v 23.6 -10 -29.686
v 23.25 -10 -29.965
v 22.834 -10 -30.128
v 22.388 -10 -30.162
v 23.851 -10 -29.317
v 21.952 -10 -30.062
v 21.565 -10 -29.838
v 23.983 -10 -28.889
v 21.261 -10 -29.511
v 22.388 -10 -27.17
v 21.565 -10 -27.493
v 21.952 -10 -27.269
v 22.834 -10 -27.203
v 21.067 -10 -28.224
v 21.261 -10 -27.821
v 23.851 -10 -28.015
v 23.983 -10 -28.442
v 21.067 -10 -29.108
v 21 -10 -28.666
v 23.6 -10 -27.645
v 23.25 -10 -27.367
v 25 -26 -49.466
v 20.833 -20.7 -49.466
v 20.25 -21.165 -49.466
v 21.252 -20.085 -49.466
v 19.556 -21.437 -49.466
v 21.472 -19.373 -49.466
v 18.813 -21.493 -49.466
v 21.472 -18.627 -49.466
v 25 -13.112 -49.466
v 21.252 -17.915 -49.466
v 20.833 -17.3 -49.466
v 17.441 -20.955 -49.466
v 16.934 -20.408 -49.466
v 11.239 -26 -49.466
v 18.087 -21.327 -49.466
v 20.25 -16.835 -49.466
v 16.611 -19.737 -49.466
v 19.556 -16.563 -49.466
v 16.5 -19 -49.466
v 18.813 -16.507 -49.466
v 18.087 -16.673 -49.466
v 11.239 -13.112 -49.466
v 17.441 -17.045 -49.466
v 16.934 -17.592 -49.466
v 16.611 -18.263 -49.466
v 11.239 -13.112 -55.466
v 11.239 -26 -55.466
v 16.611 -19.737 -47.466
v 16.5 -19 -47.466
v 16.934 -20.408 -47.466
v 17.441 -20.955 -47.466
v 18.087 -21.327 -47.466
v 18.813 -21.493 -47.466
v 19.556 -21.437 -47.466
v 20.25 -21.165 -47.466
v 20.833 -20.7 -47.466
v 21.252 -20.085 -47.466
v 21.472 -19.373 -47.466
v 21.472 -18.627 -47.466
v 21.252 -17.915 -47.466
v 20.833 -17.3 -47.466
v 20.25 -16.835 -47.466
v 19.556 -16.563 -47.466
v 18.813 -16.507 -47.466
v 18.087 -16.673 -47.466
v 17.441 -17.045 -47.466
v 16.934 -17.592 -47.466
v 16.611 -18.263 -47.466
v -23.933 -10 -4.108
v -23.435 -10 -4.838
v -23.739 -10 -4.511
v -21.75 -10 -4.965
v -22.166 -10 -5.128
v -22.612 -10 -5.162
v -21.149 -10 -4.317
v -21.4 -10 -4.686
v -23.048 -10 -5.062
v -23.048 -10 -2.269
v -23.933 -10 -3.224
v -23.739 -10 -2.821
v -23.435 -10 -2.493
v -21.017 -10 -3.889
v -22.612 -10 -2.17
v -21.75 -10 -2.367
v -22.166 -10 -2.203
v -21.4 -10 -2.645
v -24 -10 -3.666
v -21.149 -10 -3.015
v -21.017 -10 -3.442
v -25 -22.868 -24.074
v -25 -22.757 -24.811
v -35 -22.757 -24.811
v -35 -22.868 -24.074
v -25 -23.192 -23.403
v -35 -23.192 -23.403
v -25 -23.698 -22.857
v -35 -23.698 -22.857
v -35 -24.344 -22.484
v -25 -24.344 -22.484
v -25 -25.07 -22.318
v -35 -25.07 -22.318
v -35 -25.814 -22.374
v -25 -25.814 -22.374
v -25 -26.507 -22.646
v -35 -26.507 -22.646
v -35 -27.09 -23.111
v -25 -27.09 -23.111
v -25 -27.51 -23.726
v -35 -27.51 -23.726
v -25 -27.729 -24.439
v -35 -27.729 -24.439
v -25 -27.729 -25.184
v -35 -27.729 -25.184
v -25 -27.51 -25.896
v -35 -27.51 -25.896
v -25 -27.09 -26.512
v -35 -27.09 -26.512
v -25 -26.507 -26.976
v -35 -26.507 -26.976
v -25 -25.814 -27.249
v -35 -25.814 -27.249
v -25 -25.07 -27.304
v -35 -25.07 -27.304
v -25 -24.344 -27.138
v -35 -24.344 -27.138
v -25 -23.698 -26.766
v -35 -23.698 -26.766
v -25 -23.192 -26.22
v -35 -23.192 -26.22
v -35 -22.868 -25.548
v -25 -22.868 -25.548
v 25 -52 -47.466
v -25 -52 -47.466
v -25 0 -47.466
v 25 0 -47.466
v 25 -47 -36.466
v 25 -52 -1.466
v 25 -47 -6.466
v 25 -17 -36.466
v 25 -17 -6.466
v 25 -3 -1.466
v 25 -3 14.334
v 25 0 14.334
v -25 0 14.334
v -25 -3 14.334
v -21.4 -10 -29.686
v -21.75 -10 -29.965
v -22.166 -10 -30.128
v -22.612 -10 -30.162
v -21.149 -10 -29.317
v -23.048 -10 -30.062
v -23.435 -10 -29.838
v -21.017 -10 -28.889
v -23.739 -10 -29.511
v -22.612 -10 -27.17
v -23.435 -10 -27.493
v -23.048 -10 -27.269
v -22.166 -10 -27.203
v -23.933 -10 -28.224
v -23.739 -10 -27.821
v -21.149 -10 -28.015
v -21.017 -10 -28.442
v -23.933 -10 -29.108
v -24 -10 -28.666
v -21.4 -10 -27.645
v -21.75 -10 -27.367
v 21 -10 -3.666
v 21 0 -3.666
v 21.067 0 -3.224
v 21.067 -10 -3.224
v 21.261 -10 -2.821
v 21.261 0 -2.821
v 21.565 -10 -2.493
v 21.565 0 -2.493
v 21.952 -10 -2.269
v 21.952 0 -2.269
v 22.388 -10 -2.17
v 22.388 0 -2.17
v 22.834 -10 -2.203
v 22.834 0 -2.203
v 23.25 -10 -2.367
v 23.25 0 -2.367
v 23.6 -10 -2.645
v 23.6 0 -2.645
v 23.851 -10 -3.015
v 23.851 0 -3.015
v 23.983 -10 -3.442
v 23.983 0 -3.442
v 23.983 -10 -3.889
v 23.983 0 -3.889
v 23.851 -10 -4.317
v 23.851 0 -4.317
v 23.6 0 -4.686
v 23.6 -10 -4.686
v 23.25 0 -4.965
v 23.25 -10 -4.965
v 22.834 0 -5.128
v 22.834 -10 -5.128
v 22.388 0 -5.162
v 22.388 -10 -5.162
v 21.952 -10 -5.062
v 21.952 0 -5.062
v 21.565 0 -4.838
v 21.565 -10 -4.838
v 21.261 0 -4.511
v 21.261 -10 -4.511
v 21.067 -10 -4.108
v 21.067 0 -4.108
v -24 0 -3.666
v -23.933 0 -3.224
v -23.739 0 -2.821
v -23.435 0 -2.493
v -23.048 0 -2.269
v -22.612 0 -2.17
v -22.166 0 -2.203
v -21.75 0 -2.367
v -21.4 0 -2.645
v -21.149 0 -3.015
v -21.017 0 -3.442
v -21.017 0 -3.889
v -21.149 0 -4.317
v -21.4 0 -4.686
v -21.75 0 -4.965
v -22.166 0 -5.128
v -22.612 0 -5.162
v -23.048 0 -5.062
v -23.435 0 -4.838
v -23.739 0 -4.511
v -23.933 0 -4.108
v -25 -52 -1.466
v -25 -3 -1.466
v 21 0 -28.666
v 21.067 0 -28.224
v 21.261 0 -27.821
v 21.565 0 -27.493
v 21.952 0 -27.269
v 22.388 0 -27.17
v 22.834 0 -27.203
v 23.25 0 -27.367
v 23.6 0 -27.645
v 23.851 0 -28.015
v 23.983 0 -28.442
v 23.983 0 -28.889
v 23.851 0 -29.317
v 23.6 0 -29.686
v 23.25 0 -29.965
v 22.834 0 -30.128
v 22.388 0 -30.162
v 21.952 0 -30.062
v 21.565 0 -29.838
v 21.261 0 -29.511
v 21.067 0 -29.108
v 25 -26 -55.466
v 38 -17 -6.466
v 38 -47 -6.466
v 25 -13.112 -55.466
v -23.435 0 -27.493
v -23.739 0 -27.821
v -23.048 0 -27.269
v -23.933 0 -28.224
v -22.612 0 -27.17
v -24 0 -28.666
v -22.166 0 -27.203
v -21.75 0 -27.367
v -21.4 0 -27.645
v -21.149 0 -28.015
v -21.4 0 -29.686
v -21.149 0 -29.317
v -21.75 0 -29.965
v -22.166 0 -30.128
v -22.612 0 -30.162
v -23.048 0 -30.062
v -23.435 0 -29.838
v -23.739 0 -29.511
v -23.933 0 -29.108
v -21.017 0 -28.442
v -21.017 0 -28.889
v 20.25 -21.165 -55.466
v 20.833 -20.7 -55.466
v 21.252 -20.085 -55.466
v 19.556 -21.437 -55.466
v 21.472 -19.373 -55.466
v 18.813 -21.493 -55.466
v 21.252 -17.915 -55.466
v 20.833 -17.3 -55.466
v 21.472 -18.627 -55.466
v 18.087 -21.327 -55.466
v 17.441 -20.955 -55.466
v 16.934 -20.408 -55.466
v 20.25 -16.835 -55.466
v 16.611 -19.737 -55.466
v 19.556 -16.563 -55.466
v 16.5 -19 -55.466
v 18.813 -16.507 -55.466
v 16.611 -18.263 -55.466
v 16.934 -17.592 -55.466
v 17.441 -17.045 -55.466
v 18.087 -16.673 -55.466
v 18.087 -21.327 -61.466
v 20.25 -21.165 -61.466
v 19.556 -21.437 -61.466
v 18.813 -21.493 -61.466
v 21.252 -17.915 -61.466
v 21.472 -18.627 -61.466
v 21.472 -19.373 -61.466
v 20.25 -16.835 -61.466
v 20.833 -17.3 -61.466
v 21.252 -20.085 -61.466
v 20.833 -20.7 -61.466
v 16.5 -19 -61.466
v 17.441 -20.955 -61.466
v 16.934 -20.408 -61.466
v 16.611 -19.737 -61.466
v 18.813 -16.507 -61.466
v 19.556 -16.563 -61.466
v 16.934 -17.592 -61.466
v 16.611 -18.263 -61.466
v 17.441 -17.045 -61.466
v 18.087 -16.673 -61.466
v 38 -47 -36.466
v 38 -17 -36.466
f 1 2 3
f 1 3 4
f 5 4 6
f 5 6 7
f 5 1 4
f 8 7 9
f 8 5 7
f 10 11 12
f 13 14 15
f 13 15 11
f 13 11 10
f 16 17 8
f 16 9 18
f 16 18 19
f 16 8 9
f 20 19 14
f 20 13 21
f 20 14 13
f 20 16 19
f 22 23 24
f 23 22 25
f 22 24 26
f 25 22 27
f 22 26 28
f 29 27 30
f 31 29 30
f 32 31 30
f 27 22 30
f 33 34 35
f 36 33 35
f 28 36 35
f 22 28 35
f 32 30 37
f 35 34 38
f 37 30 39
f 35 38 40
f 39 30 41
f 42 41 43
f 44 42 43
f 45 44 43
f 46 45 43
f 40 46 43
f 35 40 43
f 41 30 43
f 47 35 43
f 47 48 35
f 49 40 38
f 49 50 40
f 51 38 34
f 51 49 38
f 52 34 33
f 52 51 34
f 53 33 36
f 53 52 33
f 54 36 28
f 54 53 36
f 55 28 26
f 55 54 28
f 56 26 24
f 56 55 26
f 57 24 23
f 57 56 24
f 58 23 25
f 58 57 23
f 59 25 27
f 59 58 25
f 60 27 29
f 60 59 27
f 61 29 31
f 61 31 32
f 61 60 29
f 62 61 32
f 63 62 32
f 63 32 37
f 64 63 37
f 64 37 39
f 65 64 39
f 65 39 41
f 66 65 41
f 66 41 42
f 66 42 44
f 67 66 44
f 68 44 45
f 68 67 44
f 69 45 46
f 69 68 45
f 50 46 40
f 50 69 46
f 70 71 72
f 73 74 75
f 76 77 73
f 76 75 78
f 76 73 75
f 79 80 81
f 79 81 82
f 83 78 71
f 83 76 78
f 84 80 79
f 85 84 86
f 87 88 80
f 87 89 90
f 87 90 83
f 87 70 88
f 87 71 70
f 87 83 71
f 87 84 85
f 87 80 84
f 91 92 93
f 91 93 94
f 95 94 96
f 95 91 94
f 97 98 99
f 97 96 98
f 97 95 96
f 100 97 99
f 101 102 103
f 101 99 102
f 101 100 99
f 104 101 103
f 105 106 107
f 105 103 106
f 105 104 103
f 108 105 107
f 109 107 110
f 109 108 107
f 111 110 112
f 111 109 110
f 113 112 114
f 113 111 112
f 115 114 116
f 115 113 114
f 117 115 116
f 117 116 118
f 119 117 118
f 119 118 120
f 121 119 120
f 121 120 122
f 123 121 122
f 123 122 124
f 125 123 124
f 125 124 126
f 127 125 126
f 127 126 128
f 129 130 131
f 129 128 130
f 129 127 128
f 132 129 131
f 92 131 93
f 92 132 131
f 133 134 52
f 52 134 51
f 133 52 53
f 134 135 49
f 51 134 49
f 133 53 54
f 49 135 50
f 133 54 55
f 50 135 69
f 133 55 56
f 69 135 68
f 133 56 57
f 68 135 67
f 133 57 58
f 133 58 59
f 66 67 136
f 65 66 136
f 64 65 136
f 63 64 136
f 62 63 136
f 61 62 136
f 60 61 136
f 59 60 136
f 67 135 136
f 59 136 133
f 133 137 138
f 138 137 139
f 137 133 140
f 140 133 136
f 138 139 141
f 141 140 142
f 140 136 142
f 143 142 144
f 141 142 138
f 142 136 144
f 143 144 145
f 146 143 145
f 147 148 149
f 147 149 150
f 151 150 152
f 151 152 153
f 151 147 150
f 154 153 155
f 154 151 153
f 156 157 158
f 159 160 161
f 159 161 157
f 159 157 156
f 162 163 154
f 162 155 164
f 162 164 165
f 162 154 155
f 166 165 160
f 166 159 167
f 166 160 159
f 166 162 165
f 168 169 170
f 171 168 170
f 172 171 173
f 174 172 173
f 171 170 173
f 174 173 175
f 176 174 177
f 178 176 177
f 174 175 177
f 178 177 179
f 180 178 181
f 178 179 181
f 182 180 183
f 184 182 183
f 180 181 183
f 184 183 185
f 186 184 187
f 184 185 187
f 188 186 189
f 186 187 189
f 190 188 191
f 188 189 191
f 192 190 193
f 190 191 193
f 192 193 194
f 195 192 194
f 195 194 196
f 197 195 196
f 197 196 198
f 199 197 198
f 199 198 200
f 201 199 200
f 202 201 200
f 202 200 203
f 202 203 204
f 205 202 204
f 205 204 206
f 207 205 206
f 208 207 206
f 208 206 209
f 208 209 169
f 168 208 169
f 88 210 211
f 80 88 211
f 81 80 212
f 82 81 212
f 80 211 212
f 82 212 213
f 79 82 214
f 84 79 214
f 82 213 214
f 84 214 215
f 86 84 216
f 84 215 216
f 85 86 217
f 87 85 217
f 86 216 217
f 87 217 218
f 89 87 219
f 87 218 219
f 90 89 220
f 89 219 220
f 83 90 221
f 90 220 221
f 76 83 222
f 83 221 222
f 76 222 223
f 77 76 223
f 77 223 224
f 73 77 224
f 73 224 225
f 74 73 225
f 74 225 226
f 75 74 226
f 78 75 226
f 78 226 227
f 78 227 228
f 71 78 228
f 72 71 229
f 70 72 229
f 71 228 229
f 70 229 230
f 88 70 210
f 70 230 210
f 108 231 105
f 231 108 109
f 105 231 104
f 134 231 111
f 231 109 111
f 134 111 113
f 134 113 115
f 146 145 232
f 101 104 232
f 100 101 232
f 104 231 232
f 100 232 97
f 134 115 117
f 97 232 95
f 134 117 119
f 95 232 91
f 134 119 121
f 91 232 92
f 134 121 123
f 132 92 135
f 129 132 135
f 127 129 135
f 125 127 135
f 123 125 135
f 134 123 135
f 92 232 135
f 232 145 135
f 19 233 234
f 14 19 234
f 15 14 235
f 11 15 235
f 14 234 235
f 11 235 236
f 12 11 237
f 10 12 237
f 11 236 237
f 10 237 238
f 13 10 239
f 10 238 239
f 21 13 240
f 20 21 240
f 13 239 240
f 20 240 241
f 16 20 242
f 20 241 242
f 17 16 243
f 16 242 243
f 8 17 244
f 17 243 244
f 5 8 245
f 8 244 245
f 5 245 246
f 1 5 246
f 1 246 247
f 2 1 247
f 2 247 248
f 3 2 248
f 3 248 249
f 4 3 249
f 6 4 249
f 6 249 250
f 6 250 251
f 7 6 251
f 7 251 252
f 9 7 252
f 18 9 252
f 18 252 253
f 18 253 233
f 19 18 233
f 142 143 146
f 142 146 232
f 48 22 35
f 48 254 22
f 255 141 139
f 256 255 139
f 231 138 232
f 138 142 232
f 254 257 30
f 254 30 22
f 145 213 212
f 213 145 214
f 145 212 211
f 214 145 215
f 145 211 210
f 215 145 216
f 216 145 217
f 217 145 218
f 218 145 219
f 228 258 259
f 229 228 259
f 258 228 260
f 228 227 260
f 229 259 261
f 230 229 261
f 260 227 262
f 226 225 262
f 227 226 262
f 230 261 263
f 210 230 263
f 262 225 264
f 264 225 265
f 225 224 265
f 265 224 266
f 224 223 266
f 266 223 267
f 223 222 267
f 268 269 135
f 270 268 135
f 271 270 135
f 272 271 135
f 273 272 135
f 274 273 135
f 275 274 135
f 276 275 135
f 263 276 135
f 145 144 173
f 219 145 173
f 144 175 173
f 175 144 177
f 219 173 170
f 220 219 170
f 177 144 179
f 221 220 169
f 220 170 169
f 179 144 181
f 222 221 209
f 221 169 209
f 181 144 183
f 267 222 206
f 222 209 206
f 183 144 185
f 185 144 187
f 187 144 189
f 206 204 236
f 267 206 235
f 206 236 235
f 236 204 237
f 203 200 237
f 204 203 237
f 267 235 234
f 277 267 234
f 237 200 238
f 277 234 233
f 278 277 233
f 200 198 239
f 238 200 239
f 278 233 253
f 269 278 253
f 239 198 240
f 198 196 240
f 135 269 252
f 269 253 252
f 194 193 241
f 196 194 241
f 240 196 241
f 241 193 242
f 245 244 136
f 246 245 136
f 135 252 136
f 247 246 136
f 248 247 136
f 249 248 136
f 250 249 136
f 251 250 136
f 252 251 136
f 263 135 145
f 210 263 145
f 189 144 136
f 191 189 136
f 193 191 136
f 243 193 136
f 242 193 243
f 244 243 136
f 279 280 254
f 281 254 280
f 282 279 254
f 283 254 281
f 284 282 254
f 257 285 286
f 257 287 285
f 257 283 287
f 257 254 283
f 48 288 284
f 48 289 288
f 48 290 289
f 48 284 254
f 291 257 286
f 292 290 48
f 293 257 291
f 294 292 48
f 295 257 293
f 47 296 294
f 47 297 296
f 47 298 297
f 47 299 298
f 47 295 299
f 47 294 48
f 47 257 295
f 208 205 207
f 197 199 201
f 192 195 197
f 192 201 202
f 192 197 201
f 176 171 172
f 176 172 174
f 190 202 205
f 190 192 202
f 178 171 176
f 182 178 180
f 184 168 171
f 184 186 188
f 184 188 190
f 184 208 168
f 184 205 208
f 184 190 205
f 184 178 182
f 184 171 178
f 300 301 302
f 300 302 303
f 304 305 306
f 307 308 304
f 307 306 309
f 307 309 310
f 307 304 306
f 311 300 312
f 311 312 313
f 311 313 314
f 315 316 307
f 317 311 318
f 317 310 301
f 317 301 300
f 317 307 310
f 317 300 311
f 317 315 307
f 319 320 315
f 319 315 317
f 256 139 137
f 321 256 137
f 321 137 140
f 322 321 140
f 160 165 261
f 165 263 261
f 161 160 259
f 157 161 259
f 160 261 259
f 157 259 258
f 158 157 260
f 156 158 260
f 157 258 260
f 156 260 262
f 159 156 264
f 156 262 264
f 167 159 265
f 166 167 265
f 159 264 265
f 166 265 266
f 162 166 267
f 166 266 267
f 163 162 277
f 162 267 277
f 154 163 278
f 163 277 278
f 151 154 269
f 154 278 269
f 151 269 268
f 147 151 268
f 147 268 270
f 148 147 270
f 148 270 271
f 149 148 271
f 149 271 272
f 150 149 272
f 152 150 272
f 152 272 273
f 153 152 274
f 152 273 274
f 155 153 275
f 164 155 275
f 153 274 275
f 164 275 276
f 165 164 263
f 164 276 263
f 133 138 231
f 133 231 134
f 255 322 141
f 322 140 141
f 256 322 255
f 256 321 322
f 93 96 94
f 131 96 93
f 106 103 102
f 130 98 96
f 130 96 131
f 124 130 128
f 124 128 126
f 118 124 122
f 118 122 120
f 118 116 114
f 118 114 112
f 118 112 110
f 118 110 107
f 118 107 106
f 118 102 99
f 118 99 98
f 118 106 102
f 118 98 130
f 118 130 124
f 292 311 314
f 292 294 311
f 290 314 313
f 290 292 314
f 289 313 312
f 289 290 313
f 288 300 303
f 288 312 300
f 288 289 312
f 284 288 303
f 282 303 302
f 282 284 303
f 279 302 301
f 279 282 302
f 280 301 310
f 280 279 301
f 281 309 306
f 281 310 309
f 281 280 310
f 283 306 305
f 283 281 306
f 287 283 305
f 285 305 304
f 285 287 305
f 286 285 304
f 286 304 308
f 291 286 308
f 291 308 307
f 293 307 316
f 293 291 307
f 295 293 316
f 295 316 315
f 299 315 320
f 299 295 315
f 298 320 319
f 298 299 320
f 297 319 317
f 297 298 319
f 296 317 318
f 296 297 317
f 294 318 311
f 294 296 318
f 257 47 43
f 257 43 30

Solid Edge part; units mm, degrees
sketch "Sketch1" plane through (0, 0, 0) normal (0, -1, 0) x (1, 0, 0)
  line L0 (-25, 14.3343) -> (-25, -47.4657)
  line L1 (-25, -47.4657) -> (25, -47.4657)
  line L2 (25, -47.4657) -> (25, 14.3343)
  line L3 (25, 14.3343) -> (-25, 14.3343)
  dimension "D1" = 50
  dimension "D2" = 25
  dimension "D3" = 61.8
extrude "Protrusion1" add sketch "Sketch1" along normal blind 3
sketch "Sketch2" plane through (0, 0, 0) normal (0, -1, 0) x (1, 0, 0)
  line L0 (0, -1.4657) -> (-25, -1.4657)
  line L1 (-25, -1.4657) -> (-25, -47.4657)
  line L2 (-25, -47.4657) -> (25, -47.4657)
  line L3 (25, -47.4657) -> (25, -1.4657)
  line L4 (25, -1.4657) -> (0, -1.4657)
extrude "ExtrudedProtrusion_2" add sketch "Sketch2" along normal blind 52
sketch "Sketch3" plane through (25, -26, -16.5657) normal (1, 0, 0) x (0, 1, 0)
  line L0 (-21, -19.9) -> (9, -19.9)
  line L1 (9, -19.9) -> (9, 10.1)
  line L2 (9, 10.1) -> (-21, 10.1)
  line L3 (-21, 10.1) -> (-21, -19.9)
  dimension "D1" = 5
  dimension "D2" = 5
  dimension "D3" = 30
  dimension "D4" = 30
extrude "ExtrudedProtrusion_3" add sketch "Sketch3" along normal blind 13
sketch "Sketch4" plane through (-25, -26, -16.5657) normal (-1, 0, 0) x (0, 1, 0)
  circle A0 centre (0.7428, 8.2455) radius 2.5
extrude "ExtrudedProtrusion_4" add sketch "Sketch4" along normal blind 10
sketch "Sketch5" plane through (0, 0, -16.5657) normal (0, 1, 0) x (-1, 0, 0)
  circle A0 centre (22.5, 12.9) radius 1.5
  circle A1 centre (-22.5, -12.1) radius 1.5
  circle A2 centre (22.5, -12.1) radius 1.5
  circle A3 centre (-22.5, 12.9) radius 1.5
  dimension "D1" = 18
  dimension "D2" = 22.5
  dimension "D3" = 45
  dimension "D4" = 22.5
  dimension "D5" = 25
extrude "ExtrudedCutout_1" cut sketch "Sketch5" against normal blind 10
sketch "Sketch6" plane through (0, -26, -47.4657) normal (0, 0, -1) x (-1, 0, 0)
  circle A0 centre (-19, 7) radius 2.5
  dimension "D1" = 33
  dimension "D2" = 6
extrude "ExtrudedProtrusion_5" add sketch "Sketch6" along normal blind 8
sketch "Sketch7" plane through (19, -19, -55.4657) normal (0, 0, -1) x (-1, 0, 0)
  line L0 (-6, 5.8881) -> (-6, -7)
  line L1 (-6, -7) -> (7.7613, -7)
  line L2 (7.7613, -7) -> (7.7613, 5.8881)
  line L3 (7.7613, 5.8881) -> (-6, 5.8881)
  dimension "D1" = 12.8881
extrude "ExtrudedProtrusion_6" add sketch "Sketch7" against normal blind 6
sketch "Sketch8" plane through (18.1194, -19.5559, -55.4657) normal (0, 0, -1) x (-1, 0, 0)
  circle A0 centre (-0.8806, 0.5559) radius 2.5
extrude "ExtrudedProtrusion_7" add sketch "Sketch8" along normal blind 6
